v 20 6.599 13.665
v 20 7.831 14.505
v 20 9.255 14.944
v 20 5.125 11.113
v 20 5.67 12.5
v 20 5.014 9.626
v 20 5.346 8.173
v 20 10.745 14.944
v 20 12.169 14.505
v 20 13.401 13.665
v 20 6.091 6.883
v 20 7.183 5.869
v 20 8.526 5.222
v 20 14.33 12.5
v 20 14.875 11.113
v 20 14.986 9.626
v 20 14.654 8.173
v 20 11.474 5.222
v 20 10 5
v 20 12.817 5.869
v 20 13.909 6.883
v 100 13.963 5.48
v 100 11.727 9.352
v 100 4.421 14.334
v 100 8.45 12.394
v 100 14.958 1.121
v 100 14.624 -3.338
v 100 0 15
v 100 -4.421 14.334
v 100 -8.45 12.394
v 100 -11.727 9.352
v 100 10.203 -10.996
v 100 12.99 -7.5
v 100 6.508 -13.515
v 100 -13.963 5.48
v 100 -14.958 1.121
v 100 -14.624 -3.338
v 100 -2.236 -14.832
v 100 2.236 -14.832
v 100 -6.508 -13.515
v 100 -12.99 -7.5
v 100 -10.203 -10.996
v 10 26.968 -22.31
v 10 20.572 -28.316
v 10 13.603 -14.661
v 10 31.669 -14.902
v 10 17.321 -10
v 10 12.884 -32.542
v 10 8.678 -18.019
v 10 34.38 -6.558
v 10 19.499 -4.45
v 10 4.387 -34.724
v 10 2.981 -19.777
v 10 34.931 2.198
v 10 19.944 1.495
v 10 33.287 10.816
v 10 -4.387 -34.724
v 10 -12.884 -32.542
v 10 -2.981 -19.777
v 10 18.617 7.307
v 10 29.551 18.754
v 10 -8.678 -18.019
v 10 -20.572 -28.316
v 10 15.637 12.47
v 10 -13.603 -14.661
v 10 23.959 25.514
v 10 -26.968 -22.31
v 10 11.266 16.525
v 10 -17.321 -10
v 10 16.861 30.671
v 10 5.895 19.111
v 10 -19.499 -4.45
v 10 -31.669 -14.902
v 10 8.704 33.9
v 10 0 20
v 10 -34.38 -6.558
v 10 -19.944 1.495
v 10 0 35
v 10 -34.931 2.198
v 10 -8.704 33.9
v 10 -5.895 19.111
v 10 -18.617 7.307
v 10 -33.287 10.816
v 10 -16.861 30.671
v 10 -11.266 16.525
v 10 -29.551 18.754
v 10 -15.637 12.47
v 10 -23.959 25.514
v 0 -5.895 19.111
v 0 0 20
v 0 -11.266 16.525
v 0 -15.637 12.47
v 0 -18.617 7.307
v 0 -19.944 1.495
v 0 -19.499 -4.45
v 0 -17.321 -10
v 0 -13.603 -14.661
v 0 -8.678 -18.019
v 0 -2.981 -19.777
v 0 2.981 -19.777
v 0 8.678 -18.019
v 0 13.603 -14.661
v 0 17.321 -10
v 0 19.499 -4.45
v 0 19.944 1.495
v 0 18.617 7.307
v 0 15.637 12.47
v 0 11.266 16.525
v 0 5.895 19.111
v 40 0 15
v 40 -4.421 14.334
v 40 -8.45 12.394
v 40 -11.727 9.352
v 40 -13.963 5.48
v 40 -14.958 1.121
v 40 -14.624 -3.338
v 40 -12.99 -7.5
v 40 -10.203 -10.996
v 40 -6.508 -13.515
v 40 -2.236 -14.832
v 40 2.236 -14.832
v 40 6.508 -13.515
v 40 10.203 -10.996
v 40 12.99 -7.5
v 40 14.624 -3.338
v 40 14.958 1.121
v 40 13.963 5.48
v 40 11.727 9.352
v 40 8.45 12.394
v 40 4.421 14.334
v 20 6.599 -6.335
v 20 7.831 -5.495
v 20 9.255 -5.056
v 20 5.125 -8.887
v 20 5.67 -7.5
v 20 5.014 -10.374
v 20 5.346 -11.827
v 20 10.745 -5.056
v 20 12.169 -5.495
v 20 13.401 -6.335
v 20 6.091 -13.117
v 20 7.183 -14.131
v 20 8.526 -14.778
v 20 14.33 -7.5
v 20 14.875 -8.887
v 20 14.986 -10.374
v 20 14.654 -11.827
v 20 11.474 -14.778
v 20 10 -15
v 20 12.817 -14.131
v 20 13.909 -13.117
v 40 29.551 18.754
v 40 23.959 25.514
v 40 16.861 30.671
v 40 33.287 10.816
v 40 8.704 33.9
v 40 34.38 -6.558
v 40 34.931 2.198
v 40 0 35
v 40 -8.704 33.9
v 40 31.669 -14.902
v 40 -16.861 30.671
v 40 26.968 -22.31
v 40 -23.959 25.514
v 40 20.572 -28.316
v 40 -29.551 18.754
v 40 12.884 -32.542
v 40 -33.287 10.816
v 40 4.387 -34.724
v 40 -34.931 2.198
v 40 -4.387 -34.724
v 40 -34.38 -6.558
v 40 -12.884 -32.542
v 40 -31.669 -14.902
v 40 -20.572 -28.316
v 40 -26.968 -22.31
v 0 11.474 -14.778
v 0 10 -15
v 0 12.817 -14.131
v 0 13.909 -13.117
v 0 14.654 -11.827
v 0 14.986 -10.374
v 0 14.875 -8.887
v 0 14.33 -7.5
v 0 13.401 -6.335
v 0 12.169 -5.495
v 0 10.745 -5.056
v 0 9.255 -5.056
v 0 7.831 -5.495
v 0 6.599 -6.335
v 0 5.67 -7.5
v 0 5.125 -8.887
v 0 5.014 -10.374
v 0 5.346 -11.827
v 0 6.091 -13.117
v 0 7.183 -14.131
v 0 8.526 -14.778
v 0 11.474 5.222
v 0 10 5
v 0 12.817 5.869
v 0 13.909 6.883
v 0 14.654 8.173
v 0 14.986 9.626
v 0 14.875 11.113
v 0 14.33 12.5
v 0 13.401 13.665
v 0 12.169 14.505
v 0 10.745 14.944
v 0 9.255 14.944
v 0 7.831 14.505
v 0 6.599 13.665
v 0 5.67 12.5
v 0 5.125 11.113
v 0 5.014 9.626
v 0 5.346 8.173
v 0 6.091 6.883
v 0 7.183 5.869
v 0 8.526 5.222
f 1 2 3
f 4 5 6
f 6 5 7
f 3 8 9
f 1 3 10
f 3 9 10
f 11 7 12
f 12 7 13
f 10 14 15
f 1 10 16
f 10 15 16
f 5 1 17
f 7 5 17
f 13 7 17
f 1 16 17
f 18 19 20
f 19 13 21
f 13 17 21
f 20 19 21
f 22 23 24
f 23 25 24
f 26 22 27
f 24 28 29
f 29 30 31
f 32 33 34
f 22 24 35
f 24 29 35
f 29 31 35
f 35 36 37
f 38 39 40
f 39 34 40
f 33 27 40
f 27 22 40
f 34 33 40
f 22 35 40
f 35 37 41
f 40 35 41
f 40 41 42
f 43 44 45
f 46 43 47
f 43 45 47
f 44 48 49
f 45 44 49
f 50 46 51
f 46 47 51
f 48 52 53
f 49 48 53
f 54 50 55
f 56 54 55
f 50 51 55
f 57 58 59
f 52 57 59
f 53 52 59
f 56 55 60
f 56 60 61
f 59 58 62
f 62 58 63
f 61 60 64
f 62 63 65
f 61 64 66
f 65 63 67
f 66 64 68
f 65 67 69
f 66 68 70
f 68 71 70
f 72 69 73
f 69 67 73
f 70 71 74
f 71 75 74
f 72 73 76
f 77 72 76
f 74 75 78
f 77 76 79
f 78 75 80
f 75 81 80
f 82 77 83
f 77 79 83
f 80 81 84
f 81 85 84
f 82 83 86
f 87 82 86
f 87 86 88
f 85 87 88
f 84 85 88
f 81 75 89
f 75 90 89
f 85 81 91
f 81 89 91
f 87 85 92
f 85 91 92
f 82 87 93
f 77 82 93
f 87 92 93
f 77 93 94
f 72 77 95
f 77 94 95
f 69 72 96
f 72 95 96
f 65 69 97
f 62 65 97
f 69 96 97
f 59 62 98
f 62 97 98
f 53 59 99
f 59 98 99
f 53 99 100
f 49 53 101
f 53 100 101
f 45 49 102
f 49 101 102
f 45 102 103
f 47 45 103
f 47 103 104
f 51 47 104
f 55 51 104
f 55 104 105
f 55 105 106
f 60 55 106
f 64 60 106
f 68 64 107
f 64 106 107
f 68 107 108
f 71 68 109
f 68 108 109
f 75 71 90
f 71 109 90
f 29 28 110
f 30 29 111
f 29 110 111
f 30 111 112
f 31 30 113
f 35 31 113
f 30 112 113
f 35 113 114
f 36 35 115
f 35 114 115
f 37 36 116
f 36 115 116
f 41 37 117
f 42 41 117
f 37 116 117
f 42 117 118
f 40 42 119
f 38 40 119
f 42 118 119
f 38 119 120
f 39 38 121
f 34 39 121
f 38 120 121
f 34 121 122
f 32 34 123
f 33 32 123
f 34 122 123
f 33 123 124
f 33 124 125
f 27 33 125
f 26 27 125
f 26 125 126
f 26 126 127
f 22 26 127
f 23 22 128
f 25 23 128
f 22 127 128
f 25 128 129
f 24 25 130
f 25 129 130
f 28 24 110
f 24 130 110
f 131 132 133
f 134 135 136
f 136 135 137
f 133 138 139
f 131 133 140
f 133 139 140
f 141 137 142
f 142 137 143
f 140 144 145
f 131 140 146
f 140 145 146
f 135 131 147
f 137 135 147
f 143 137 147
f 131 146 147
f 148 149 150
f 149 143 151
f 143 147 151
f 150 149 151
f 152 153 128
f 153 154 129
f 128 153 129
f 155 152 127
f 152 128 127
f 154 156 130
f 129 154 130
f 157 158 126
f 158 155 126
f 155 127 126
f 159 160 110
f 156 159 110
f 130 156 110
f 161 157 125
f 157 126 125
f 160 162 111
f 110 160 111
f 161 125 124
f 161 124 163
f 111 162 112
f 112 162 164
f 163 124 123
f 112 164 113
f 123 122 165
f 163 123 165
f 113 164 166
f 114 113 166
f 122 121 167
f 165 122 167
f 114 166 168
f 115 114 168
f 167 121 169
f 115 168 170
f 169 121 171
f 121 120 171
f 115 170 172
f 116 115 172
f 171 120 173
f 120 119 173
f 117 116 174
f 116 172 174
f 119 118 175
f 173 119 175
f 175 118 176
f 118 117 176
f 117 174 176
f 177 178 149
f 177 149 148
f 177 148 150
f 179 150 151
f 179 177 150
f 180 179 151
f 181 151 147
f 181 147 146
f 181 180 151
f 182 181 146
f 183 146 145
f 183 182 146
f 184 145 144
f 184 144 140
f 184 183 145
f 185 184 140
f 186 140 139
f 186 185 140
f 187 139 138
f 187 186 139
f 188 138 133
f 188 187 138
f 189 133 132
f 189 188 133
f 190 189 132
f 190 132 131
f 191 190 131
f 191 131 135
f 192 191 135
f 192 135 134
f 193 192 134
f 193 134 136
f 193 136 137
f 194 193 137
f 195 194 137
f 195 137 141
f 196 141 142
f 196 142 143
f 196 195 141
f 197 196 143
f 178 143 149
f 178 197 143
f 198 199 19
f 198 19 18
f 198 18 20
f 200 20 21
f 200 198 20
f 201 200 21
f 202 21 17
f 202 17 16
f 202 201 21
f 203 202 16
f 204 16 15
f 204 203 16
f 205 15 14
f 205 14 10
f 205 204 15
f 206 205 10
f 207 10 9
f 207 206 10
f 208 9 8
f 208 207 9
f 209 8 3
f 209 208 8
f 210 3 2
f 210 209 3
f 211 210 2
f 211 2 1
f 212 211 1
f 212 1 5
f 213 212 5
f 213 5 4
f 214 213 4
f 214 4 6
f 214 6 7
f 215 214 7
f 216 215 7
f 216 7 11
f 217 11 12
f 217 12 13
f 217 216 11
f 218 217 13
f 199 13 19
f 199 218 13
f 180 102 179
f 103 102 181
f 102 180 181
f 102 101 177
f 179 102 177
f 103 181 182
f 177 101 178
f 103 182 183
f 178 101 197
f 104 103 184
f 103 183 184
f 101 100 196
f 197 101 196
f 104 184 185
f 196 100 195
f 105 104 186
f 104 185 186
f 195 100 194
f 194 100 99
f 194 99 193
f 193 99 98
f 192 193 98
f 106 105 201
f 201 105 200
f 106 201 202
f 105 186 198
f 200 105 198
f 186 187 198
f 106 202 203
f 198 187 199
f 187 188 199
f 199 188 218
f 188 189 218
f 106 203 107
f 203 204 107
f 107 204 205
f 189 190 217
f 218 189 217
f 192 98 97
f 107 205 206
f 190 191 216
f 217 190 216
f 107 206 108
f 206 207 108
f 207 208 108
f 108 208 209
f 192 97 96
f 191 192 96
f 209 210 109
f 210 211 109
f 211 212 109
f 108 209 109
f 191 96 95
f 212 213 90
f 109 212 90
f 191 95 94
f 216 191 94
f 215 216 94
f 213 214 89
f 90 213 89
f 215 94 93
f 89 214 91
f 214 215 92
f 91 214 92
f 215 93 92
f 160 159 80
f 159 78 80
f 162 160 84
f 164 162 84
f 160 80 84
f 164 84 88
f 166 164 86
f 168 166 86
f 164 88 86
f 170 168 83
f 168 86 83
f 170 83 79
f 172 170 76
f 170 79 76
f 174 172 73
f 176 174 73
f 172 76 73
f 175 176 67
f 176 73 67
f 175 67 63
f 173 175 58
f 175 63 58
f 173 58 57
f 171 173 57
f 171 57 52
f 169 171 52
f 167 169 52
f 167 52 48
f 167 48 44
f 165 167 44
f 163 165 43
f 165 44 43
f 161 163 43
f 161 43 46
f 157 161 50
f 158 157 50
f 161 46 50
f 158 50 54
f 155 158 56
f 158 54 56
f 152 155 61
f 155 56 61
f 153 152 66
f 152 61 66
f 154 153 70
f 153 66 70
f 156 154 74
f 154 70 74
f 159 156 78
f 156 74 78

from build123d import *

# Parameters (mm, degrees)
SKETCH_2_R          = 5
CUT_EXTRUDE_1_DEPTH = 20
SKETCH_3_R          = 5
CUT_EXTRUDE_2_DEPTH = 20


with BuildPart() as part:
    # Эскиз1 → Повернуть1 (revolve)
    with BuildSketch(Plane.XY, mode=Mode.PRIVATE) as revolve_1_sk:
        Polygon((0, 0), (100, 0), (100, 15), (40, 15), (40, 35), (10, 35), (10, 20), (0, 20), align=None)
    revolve(revolve_1_sk.sketch.rotate(Axis((0, 0, 0), (1, 0, 0)), 90), axis=Axis((0, 0, 0), (1, 0, 0)))

    # Эскиз2 → Вырез-Вытянуть1 (cut)
    with BuildSketch(Plane(origin=(0, 0, 0), x_dir=(0, 0, -1), z_dir=(1, 0, 0))):
        with Locations((10, 10)):
            Circle(SKETCH_2_R)
    extrude(amount=CUT_EXTRUDE_1_DEPTH, mode=Mode.SUBTRACT)

    # Эскиз3 → Вырез-Вытянуть2 (cut)
    with BuildSketch(Plane(origin=(0, 0, 0), x_dir=(0, 0, -1), z_dir=(1, 0, 0))):
        with Locations((-10, 10)):
            Circle(SKETCH_3_R)
    extrude(amount=CUT_EXTRUDE_2_DEPTH, mode=Mode.SUBTRACT)


solid = part.part
